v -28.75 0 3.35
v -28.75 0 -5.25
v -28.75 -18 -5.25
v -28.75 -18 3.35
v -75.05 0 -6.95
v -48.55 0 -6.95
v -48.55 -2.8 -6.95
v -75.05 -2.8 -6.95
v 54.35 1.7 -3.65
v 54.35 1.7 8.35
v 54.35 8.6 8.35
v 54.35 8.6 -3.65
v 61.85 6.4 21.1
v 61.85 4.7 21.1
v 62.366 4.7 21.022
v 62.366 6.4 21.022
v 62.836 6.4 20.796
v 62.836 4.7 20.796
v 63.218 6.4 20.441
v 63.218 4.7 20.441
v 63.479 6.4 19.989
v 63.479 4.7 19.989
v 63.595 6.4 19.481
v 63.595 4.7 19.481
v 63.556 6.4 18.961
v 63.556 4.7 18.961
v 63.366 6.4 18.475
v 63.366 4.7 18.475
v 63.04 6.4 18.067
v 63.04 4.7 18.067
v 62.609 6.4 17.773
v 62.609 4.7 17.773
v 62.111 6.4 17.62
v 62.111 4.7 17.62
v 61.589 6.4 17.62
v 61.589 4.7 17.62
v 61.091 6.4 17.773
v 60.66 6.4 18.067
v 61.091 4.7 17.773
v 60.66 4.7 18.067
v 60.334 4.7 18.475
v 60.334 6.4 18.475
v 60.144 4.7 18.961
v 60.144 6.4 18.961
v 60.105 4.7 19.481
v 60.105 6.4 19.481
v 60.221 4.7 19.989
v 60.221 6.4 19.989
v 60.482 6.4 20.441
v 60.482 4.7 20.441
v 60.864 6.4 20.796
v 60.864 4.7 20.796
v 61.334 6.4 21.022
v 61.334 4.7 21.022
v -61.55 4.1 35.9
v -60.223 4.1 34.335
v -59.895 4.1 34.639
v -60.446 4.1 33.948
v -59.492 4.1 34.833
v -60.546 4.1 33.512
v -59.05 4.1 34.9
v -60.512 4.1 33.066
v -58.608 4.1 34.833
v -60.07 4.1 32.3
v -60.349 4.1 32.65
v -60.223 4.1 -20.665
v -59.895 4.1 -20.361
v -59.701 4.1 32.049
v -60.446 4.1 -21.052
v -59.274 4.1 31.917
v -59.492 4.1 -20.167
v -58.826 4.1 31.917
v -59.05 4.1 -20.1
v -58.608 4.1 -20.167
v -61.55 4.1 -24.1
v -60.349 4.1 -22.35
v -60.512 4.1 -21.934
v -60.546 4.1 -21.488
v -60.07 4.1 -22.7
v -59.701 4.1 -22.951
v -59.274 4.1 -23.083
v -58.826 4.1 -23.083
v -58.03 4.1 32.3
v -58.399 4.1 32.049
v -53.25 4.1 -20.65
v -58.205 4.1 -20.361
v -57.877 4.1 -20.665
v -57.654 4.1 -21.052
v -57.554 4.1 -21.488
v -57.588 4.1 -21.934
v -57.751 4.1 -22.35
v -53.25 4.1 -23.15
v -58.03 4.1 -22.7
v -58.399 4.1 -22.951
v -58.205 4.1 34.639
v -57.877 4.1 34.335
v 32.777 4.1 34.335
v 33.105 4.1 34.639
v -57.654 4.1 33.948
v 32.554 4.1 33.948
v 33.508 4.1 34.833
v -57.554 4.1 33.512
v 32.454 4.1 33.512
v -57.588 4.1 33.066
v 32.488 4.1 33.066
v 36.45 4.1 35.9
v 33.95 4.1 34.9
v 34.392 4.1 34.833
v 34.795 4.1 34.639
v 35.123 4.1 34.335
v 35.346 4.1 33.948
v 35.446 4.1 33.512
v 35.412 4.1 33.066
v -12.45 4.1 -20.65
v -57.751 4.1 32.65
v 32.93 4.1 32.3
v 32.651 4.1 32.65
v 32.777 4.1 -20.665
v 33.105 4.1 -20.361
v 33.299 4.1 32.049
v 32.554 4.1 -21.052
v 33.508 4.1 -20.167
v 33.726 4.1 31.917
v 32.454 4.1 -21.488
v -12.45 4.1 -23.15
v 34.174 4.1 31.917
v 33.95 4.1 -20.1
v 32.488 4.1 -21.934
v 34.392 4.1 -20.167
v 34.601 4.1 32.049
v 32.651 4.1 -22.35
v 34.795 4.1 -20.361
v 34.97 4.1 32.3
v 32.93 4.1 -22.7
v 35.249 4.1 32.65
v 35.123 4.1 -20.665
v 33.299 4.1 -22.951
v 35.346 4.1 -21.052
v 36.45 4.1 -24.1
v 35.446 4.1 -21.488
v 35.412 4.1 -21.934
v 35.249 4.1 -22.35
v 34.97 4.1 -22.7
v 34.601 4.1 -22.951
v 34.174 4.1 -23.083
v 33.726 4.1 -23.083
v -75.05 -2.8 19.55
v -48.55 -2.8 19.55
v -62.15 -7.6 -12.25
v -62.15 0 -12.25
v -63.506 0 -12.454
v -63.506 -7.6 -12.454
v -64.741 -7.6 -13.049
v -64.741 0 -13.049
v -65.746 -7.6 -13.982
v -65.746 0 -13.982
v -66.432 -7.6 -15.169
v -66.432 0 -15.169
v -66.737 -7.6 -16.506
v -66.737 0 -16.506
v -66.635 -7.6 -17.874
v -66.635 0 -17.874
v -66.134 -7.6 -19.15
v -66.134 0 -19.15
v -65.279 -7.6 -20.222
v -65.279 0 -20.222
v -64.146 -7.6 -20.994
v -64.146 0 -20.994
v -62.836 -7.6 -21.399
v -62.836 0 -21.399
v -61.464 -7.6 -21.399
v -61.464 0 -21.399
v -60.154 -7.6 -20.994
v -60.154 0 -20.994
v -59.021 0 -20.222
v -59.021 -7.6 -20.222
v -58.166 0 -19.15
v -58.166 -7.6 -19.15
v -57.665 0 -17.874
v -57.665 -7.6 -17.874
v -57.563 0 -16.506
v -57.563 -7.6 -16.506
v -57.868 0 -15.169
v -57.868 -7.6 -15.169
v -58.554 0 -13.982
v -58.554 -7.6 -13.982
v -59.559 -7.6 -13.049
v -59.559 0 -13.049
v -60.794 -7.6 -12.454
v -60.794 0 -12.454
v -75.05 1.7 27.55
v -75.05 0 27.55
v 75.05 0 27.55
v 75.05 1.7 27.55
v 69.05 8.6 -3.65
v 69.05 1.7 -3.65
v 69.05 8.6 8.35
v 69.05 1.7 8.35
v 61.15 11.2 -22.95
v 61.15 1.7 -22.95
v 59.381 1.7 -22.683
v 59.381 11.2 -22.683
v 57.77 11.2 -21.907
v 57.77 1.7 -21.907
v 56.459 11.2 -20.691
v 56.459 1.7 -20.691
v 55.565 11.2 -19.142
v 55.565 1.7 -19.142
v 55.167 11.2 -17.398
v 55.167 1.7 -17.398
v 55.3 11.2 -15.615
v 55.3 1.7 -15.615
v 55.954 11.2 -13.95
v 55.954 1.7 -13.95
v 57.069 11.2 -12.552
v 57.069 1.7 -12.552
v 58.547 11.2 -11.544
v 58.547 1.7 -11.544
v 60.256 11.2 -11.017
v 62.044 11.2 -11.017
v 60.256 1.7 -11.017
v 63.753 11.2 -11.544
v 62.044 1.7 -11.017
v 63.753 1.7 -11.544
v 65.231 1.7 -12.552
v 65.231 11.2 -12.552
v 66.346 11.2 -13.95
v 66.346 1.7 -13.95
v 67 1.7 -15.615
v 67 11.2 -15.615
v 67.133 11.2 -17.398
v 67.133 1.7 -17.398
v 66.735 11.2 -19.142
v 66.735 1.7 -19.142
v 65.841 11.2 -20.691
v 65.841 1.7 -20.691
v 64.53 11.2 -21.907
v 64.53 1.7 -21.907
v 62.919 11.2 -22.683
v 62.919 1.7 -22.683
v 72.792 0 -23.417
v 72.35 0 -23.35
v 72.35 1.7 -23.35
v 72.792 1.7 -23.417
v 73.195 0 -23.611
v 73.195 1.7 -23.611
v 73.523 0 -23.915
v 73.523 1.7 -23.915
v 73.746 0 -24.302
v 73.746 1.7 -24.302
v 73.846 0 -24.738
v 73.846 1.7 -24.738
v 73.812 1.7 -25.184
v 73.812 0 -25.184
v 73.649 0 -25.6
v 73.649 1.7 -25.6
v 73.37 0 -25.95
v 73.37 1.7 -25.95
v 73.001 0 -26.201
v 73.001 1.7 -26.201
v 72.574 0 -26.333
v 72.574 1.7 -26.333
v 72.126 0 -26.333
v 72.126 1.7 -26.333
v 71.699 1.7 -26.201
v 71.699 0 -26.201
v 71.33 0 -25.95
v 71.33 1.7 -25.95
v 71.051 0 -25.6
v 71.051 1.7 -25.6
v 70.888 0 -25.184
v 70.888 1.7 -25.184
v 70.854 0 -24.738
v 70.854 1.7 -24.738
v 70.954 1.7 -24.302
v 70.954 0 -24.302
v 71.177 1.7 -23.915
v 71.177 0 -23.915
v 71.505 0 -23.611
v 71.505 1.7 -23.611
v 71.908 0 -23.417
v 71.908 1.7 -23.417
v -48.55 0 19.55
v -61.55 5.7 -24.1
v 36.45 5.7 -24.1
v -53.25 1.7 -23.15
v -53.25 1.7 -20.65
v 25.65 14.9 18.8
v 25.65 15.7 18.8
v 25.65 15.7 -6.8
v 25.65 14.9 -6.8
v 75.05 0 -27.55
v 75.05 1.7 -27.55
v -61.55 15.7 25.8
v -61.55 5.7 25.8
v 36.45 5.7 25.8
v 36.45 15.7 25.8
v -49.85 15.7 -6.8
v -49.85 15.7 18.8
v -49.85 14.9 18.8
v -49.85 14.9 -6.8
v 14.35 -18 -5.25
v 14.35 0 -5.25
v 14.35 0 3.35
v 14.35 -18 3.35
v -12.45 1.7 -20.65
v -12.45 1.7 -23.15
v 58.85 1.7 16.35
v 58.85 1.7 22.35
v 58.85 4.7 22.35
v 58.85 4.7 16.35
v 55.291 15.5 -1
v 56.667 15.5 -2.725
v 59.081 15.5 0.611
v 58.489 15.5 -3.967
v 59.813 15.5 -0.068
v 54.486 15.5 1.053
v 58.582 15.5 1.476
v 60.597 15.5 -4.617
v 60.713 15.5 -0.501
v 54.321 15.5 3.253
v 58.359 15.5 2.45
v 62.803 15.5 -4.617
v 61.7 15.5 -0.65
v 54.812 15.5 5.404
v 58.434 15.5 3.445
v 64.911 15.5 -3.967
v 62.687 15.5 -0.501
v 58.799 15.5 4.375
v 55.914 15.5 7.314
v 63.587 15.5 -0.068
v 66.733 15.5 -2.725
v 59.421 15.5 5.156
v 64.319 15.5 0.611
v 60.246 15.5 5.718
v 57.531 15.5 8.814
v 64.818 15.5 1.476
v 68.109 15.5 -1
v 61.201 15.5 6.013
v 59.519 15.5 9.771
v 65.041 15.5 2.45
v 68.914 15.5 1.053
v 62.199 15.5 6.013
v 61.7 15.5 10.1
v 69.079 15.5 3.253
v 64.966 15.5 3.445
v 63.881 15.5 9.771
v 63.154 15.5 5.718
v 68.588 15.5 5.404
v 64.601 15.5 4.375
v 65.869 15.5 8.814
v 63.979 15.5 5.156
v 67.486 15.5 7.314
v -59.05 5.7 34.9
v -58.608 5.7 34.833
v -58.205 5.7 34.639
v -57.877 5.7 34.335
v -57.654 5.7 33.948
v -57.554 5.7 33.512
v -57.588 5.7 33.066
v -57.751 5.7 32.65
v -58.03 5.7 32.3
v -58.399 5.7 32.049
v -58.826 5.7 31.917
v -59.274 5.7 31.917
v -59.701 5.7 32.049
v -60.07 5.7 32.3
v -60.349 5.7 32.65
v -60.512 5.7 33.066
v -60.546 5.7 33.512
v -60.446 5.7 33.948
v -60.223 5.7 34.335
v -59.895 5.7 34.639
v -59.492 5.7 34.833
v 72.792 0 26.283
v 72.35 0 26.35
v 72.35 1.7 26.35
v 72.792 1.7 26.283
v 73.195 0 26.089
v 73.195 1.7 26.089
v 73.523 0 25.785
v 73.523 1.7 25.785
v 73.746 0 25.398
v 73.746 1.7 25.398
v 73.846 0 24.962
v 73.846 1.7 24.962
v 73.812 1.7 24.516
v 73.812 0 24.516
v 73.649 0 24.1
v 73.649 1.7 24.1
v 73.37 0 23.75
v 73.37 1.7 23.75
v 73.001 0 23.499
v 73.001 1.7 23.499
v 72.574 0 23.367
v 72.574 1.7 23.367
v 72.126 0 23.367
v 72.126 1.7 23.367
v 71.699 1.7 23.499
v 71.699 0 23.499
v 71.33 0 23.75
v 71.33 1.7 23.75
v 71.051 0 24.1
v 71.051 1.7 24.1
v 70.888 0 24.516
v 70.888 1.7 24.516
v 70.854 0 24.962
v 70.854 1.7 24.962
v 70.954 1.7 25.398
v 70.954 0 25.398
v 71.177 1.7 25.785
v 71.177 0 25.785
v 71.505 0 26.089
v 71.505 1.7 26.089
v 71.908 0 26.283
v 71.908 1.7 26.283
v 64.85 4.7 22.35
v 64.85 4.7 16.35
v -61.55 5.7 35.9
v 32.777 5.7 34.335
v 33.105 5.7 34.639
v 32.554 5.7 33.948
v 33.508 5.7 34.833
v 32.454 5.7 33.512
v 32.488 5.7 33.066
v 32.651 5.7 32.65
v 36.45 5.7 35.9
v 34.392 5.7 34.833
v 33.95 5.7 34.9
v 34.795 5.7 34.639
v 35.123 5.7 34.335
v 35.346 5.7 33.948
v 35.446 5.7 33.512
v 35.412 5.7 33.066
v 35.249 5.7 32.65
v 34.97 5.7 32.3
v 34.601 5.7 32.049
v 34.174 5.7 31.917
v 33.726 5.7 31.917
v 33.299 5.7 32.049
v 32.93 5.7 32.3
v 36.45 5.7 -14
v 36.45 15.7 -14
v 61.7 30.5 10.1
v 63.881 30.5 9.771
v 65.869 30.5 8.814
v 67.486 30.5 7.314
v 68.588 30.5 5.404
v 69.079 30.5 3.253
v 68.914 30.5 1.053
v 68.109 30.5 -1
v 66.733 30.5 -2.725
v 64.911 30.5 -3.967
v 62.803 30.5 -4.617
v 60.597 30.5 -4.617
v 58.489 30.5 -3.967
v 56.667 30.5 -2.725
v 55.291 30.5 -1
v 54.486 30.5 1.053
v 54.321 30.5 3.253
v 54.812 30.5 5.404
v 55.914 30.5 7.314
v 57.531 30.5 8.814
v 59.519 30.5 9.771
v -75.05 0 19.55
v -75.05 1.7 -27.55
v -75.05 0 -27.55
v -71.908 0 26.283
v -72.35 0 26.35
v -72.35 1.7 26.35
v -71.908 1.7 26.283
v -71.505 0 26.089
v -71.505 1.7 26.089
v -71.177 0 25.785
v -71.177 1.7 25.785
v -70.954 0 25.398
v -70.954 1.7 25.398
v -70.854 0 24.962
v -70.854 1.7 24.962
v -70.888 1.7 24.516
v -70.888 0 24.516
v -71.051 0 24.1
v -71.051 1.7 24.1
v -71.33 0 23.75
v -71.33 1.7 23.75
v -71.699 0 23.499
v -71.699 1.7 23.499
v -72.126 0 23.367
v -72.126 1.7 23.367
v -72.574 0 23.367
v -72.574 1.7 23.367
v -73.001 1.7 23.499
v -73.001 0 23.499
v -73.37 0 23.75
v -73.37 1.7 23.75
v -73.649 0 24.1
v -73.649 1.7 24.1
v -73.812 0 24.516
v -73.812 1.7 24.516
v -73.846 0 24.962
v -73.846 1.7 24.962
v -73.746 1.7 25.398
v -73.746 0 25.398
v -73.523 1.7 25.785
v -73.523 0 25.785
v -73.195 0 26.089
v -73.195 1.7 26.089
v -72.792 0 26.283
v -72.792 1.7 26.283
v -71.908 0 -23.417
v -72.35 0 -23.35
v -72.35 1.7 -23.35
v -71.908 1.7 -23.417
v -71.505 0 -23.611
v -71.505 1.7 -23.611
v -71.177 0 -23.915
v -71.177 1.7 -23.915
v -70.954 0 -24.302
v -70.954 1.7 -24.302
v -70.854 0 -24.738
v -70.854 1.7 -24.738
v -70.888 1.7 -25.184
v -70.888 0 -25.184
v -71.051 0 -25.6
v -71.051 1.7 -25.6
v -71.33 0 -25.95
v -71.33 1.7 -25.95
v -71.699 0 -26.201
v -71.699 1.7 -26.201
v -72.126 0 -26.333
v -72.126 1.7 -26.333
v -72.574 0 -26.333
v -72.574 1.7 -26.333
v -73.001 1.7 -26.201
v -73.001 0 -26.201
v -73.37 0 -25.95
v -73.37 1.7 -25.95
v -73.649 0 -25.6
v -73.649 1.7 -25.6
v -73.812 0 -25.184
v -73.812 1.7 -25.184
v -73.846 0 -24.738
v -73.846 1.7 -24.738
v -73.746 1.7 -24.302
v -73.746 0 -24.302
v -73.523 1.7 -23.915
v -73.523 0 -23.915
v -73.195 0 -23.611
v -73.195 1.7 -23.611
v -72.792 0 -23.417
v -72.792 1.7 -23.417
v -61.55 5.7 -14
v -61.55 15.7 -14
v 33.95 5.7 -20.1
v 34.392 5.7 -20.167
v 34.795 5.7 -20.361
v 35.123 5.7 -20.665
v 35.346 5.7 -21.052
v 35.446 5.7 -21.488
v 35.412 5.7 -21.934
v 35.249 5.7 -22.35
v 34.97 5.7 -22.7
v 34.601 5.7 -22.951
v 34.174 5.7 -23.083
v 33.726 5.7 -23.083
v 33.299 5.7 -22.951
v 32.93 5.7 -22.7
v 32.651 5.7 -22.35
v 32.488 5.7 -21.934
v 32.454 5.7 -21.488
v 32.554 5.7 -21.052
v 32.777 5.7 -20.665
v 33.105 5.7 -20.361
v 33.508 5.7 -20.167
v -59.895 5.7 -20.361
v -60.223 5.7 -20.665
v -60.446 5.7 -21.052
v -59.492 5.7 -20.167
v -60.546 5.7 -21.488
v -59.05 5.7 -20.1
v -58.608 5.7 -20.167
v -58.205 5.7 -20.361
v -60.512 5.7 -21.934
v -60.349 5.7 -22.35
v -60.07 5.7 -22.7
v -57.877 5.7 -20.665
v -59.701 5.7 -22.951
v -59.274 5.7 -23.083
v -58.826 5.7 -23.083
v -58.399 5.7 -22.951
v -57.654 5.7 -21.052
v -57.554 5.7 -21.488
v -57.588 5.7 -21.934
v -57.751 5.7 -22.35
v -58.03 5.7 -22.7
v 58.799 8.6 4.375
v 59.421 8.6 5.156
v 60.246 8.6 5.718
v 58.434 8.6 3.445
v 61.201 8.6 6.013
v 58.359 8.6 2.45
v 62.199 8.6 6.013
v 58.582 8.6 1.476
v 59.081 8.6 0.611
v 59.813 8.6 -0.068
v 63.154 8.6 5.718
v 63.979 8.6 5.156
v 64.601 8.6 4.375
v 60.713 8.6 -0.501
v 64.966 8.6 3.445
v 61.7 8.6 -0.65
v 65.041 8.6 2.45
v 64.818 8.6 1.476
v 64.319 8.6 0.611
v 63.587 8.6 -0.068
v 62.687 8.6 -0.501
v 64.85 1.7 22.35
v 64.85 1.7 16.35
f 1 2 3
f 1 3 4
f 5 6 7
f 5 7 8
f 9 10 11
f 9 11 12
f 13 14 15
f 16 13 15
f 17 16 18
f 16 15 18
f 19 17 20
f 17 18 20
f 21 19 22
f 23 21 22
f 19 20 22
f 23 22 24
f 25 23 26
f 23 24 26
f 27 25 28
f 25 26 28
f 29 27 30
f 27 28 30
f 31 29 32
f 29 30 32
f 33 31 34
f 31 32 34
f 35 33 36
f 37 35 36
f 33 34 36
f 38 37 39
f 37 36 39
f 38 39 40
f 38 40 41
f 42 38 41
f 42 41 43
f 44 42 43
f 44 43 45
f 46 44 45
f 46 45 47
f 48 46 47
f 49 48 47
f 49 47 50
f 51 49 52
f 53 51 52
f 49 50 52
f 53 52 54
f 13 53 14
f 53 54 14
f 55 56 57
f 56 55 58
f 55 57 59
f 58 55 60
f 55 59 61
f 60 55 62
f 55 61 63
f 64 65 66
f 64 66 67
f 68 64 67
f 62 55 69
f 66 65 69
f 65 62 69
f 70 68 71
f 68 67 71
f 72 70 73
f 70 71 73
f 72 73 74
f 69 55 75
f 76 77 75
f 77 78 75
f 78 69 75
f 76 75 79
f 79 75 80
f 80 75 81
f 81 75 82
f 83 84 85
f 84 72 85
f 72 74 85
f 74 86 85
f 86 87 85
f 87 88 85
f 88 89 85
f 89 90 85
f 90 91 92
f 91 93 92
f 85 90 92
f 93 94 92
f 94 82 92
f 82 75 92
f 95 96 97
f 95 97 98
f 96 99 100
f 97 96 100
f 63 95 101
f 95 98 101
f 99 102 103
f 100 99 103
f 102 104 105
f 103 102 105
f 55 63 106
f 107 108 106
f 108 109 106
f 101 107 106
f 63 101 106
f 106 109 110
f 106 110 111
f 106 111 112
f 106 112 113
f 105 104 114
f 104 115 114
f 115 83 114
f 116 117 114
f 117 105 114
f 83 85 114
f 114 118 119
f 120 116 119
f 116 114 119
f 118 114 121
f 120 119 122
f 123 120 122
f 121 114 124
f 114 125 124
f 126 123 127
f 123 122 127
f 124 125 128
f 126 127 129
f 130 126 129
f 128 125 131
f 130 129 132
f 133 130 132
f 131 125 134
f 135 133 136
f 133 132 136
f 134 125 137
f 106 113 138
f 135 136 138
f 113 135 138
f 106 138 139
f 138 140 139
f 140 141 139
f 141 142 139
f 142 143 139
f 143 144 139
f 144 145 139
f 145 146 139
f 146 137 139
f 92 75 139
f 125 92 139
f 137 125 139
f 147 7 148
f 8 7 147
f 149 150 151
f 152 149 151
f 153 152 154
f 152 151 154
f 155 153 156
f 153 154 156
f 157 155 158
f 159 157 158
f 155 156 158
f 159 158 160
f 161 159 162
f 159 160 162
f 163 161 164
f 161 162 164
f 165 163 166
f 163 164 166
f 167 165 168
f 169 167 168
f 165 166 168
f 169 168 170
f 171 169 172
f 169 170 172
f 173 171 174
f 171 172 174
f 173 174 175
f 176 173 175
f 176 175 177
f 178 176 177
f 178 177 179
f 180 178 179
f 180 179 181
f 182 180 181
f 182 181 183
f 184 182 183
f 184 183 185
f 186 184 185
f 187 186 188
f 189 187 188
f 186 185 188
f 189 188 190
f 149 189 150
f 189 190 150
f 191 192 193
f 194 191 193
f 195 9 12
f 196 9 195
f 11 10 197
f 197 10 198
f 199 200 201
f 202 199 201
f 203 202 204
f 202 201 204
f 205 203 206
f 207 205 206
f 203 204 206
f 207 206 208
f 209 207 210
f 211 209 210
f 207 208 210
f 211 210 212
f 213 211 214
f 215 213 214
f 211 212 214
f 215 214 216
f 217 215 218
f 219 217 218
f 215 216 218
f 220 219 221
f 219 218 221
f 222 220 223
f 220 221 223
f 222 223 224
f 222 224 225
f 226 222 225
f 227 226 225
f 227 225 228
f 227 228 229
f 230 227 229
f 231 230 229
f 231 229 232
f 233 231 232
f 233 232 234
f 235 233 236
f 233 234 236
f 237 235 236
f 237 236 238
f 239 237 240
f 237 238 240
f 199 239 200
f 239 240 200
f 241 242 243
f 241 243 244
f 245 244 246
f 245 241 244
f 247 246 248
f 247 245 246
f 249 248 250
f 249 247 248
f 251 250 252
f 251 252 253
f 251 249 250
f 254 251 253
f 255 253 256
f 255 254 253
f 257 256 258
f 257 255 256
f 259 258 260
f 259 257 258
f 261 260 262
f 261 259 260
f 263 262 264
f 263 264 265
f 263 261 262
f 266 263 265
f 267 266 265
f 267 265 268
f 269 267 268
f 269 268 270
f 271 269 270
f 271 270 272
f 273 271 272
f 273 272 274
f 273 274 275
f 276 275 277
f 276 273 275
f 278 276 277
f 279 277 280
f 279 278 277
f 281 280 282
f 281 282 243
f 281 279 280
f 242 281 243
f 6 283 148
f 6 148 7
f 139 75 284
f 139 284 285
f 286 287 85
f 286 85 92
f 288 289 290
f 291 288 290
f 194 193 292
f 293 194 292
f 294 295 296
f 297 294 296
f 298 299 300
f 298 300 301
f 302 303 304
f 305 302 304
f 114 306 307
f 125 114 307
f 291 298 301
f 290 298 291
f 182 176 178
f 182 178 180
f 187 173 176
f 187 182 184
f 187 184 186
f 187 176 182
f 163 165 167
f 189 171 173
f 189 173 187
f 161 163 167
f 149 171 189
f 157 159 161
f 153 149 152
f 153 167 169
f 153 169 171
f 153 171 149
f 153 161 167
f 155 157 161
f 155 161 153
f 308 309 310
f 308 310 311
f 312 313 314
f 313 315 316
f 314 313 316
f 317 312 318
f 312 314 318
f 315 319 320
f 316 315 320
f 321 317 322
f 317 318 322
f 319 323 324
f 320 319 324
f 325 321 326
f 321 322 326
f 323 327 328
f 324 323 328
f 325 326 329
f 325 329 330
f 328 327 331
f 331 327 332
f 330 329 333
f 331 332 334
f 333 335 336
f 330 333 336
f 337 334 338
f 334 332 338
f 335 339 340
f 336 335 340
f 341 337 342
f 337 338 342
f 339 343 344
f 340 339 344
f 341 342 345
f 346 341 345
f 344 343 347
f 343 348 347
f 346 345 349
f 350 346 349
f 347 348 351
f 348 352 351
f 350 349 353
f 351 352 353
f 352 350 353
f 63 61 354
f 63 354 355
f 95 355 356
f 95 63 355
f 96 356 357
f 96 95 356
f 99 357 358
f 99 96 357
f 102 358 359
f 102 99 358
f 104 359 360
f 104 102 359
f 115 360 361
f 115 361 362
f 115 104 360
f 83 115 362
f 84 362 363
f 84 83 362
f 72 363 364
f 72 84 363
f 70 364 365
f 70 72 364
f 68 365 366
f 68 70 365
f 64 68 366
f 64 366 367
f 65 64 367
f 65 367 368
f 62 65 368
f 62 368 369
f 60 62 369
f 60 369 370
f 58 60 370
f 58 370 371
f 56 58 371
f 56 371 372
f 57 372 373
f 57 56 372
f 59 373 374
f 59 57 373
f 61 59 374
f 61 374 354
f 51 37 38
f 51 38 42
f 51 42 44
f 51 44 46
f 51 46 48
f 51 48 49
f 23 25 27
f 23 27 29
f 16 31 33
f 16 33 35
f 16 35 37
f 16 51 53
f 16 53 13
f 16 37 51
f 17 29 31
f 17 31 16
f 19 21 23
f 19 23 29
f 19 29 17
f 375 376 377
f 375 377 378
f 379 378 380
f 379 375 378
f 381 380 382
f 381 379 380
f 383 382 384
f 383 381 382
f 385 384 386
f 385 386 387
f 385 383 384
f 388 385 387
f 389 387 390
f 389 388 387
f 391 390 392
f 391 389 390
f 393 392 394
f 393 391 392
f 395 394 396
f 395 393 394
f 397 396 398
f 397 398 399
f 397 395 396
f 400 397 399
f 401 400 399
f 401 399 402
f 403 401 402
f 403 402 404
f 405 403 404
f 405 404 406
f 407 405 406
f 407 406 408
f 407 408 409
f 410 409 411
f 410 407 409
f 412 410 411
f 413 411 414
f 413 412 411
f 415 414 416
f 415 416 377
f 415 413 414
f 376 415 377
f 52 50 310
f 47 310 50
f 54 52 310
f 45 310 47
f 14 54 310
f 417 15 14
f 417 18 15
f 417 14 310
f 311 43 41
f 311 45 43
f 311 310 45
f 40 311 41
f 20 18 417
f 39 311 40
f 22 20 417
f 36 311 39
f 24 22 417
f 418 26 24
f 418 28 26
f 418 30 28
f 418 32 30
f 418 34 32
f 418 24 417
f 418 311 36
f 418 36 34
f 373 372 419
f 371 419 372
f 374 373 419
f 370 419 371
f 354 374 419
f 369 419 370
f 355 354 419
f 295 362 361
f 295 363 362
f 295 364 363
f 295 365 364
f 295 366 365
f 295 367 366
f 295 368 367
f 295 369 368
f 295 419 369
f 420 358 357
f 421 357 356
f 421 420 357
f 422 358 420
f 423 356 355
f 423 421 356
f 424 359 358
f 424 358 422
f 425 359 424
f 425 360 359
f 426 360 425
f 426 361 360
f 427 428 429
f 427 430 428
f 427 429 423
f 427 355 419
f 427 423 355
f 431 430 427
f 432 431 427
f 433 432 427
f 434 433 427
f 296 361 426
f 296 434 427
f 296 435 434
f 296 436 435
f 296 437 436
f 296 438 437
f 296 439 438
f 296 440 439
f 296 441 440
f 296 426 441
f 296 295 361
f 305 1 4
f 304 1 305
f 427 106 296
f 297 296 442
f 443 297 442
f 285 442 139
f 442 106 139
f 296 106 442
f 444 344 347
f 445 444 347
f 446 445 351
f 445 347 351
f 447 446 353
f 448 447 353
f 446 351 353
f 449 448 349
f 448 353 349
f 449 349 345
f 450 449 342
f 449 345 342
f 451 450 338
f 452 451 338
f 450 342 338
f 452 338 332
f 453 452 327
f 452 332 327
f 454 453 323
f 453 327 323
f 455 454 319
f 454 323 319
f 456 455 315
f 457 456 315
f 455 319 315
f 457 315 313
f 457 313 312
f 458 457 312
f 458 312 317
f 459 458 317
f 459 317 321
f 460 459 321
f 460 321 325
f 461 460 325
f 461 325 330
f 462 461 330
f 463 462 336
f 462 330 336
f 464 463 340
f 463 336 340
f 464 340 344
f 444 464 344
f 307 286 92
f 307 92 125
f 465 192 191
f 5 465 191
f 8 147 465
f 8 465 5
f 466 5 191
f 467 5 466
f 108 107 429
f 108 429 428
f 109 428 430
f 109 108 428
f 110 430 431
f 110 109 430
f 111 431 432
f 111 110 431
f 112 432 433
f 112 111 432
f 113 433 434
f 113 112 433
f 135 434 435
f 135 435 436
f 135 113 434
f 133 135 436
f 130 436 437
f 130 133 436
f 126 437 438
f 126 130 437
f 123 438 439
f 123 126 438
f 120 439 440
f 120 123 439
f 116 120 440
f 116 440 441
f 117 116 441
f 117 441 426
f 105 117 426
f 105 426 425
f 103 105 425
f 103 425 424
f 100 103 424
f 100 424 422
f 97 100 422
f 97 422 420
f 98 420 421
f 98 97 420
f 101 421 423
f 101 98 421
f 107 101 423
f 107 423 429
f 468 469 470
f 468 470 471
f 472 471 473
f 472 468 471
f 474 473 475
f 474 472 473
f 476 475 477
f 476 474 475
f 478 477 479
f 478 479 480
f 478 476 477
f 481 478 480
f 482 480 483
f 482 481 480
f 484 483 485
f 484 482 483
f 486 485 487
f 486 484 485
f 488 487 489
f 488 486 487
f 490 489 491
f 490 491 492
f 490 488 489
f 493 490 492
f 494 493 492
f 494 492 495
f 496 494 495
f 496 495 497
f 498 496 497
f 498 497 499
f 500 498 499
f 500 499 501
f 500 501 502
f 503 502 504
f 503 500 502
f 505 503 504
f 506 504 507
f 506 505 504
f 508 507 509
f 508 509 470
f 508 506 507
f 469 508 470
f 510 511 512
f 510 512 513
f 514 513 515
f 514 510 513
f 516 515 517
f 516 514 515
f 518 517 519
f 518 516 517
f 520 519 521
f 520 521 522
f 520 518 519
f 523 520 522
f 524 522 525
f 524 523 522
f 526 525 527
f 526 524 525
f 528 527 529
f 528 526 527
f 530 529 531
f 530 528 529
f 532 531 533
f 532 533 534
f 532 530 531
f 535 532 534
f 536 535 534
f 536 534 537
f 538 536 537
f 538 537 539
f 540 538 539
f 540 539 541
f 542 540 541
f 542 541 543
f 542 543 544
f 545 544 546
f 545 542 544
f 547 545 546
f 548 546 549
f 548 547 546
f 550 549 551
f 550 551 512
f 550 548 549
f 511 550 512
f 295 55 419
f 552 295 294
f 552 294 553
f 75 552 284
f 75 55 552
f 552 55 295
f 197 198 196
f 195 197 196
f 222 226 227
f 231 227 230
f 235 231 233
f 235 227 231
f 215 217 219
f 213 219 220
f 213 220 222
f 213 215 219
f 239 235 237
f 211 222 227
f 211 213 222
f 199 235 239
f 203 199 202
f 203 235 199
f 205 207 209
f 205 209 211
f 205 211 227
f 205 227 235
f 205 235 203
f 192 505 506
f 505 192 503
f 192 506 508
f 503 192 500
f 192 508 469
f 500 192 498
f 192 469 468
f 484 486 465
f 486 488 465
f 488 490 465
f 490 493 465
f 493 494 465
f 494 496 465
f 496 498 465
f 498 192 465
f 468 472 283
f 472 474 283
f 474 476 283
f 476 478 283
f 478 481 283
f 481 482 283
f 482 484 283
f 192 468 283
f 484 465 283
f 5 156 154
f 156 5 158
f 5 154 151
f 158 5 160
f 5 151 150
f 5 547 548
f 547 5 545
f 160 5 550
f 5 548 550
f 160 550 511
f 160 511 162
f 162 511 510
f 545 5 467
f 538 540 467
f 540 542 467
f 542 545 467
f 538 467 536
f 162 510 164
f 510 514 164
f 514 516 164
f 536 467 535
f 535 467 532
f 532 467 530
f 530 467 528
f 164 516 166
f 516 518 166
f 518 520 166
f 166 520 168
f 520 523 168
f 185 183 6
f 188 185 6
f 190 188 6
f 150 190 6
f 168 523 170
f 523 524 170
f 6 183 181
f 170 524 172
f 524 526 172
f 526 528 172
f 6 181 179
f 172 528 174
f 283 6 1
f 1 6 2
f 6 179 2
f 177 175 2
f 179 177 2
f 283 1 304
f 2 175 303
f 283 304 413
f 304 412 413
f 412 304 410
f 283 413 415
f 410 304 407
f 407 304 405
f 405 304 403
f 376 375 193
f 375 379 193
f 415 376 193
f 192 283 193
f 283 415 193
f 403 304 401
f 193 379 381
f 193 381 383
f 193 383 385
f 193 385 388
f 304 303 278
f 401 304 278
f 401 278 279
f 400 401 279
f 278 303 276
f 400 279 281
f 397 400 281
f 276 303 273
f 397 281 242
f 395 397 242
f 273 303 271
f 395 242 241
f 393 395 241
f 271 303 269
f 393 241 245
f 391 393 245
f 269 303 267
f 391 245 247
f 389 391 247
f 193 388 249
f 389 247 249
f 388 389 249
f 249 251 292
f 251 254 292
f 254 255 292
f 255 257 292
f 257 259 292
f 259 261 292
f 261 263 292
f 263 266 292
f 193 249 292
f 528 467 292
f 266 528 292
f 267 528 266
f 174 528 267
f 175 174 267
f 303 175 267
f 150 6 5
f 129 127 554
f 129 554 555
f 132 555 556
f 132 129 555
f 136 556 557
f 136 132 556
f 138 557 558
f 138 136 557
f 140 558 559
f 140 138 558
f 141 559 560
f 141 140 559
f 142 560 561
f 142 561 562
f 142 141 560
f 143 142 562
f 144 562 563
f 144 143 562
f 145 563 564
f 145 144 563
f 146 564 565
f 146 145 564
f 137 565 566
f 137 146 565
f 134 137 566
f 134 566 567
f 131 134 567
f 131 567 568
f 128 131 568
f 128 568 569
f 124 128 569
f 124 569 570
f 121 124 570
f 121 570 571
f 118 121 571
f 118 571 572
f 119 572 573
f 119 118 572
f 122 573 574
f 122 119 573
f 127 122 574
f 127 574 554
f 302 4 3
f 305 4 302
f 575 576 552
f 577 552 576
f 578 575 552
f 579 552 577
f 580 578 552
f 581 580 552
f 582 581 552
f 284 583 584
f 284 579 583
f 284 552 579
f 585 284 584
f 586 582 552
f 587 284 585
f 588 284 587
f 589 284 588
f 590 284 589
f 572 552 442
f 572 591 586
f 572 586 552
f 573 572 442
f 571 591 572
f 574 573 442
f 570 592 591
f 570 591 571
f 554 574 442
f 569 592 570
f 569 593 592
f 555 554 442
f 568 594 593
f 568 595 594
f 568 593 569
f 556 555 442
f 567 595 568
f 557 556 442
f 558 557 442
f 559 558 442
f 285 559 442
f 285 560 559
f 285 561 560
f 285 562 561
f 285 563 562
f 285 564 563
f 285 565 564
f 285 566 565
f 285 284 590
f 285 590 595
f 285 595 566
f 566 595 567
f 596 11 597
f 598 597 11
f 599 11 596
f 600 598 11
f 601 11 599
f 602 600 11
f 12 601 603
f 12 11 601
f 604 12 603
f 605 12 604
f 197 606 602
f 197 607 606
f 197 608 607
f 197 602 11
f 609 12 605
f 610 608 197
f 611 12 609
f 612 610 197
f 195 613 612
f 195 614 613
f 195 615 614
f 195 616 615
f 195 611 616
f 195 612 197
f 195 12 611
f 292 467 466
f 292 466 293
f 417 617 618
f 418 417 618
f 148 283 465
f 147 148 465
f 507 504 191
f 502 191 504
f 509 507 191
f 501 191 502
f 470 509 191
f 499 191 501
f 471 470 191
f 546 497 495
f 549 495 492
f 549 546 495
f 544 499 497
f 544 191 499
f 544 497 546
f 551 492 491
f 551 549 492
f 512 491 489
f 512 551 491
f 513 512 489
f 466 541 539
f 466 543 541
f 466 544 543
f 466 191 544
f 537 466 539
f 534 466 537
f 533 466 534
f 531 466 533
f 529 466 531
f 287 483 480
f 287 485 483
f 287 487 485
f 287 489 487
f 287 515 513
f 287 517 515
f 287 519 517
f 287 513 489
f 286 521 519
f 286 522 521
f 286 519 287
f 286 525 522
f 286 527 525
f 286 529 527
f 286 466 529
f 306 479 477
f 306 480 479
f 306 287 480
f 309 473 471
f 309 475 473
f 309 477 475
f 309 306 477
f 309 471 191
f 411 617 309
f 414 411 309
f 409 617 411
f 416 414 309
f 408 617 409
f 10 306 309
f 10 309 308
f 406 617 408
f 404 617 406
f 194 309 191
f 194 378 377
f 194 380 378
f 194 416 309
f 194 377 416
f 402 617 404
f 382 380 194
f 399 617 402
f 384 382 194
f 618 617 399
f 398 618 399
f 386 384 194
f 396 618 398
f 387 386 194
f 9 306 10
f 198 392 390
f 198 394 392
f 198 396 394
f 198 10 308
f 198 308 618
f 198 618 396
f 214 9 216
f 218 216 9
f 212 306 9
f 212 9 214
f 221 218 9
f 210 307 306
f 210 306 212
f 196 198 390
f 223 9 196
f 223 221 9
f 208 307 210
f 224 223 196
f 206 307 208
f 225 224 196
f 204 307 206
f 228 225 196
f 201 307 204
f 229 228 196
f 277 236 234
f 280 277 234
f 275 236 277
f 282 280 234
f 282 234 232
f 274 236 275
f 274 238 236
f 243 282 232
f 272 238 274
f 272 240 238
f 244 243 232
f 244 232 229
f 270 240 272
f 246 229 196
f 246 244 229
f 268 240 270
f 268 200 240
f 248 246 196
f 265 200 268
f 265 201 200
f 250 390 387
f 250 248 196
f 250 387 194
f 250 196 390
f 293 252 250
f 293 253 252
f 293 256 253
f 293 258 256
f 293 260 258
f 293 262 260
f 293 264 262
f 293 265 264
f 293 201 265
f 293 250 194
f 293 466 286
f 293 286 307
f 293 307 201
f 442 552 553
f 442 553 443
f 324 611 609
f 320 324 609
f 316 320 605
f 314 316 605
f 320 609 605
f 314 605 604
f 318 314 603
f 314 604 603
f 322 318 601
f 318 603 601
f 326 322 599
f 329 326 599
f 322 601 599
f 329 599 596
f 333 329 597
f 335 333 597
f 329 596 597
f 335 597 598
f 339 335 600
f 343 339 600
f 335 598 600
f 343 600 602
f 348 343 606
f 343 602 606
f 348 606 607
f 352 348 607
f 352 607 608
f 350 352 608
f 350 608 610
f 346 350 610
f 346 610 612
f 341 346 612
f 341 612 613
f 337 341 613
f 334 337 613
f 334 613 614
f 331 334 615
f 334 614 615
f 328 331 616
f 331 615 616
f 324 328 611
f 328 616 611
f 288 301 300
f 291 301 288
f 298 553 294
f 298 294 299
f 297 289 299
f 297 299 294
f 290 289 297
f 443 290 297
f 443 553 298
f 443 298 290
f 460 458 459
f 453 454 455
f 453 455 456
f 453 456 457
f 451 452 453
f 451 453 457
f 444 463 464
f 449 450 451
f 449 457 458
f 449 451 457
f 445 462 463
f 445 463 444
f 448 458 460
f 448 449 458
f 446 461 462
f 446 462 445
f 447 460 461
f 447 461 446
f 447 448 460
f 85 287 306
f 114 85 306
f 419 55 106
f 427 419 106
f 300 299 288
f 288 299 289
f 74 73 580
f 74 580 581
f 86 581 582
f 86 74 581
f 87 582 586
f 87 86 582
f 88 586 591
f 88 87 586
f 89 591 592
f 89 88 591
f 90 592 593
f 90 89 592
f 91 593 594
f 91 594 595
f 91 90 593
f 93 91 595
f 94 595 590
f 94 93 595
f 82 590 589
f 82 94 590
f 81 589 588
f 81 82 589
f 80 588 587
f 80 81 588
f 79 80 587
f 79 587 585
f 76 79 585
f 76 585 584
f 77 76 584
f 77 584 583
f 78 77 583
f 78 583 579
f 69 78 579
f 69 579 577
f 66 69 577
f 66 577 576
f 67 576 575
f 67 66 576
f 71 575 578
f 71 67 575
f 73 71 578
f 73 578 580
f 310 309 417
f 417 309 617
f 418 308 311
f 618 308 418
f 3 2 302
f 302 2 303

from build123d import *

# Parameters (mm, degrees)
SKETCH1_W            = 150.1
SKETCH1_H            = 55.1
SKETCH1_R            = 1.5
BOSS_EXTRUDE1_DEPTH  = 1.7
SKETCH2_W            = 40.8
SKETCH2_H            = 2.5
BOSS_EXTRUDE2_DEPTH  = 2.4
SKETCH3_W            = 98
SKETCH3_H            = 60
SKETCH3_R            = 1.5
BOSS_EXTRUDE3_DEPTH  = 1.6
SKETCH4_W            = 98
SKETCH4_H            = 39.8
BOSS_EXTRUDE4_DEPTH  = 10
SKETCH5_W            = 75.5
SKETCH5_H            = 25.6
CUT_EXTRUDE1_DEPTH   = 0.8
SKETCH6_R            = 6
BOSS_EXTRUDE5_DEPTH  = 9.5
SKETCH7_W            = 6
SKETCH7_H            = 6
BOSS_EXTRUDE6_DEPTH  = 3
SKETCH8_R            = 1.75
BOSS_EXTRUDE7_DEPTH  = 1.7
SKETCH9_W            = 14.7
SKETCH9_H            = 12
BOSS_EXTRUDE8_DEPTH  = 6.9
SKETCH10_R           = 3.35
BOSS_EXTRUDE9_DEPTH  = 6.9
SKETCH11_R           = 7.4
BOSS_EXTRUDE10_DEPTH = 15
SKETCH12_W           = 26.5
SKETCH12_H           = 26.5
BOSS_EXTRUDE11_DEPTH = 2.8
SKETCH13_R           = 4.6
BOSS_EXTRUDE12_DEPTH = 7.6
SKETCH14_W           = 43.1
SKETCH14_H           = 8.6
BOSS_EXTRUDE13_DEPTH = 18


with BuildPart() as part:
    # Sketch1 → Boss-Extrude1 (new body)
    with BuildSketch(Plane(origin=(0, 0, 0), x_dir=(1, 0, 0), z_dir=(0, 1, 0))):
        Rectangle(SKETCH1_W, SKETCH1_H)
        with Locations((-72.35, 24.85)):
            Circle(SKETCH1_R, mode=Mode.SUBTRACT)
        with Locations((-72.35, -24.85)):
            Circle(SKETCH1_R, mode=Mode.SUBTRACT)
        with Locations((72.35, 24.85)):
            Circle(SKETCH1_R, mode=Mode.SUBTRACT)
        with Locations((72.35, -24.85)):
            Circle(SKETCH1_R, mode=Mode.SUBTRACT)
    extrude(amount=BOSS_EXTRUDE1_DEPTH)

    # Sketch2 → Boss-Extrude2 (add)
    with BuildSketch(Plane(origin=(0, 1.7, 0), x_dir=(1, 0, 0), z_dir=(0, 1, 0))):
        with Locations((-32.85, 21.9)):
            Rectangle(SKETCH2_W, SKETCH2_H)
    extrude(amount=BOSS_EXTRUDE2_DEPTH)

    # Sketch3 → Boss-Extrude3 (add)
    with BuildSketch(Plane(origin=(0, 4.1, 0), x_dir=(1, 0, 0), z_dir=(0, 1, 0))):
        with Locations((-12.55, -5.9)):
            Rectangle(SKETCH3_W, SKETCH3_H)
        with Locations((-59.05, 21.6)):
            Circle(SKETCH3_R, mode=Mode.SUBTRACT)
        with Locations((33.95, 21.6)):
            Circle(SKETCH3_R, mode=Mode.SUBTRACT)
        with Locations((33.95, -33.4)):
            Circle(SKETCH3_R, mode=Mode.SUBTRACT)
        with Locations((-59.05, -33.4)):
            Circle(SKETCH3_R, mode=Mode.SUBTRACT)
    extrude(amount=BOSS_EXTRUDE3_DEPTH)

    # Sketch4 → Boss-Extrude4 (add)
    with BuildSketch(Plane(origin=(0, 5.7, 0), x_dir=(1, 0, 0), z_dir=(0, 1, 0))):
        with Locations((-12.55, -5.9)):
            Rectangle(SKETCH4_W, SKETCH4_H)
    extrude(amount=BOSS_EXTRUDE4_DEPTH)

    # Sketch5 → Cut-Extrude1 (cut)
    with BuildSketch(Plane(origin=(0, 15.7, 0), x_dir=(1, 0, 0), z_dir=(0, 1, 0))):
        with Locations((-12.1, -6)):
            Rectangle(SKETCH5_W, SKETCH5_H)
    extrude(amount=-CUT_EXTRUDE1_DEPTH, mode=Mode.SUBTRACT)

    # Sketch6 → Boss-Extrude5 (add)
    with BuildSketch(Plane(origin=(0, 1.7, 0), x_dir=(1, 0, 0), z_dir=(0, 1, 0))):
        with Locations((61.15, 16.95)):
            Circle(SKETCH6_R)
    extrude(amount=BOSS_EXTRUDE5_DEPTH)

    # Sketch7 → Boss-Extrude6 (add)
    with BuildSketch(Plane(origin=(0, 1.7, 0), x_dir=(1, 0, 0), z_dir=(0, 1, 0))):
        with Locations((61.85, -19.35)):
            Rectangle(SKETCH7_W, SKETCH7_H)
    extrude(amount=BOSS_EXTRUDE6_DEPTH)

    # Sketch8 → Boss-Extrude7 (add)
    with BuildSketch(Plane(origin=(0, 4.7, 0), x_dir=(1, 0, 0), z_dir=(0, 1, 0))):
        with Locations((61.85, -19.35)):
            Circle(SKETCH8_R)
    extrude(amount=BOSS_EXTRUDE7_DEPTH)

    # Sketch9 → Boss-Extrude8 (add)
    with BuildSketch(Plane(origin=(0, 1.7, 0), x_dir=(1, 0, 0), z_dir=(0, 1, 0))):
        with Locations((61.7, -2.35)):
            Rectangle(SKETCH9_W, SKETCH9_H)
    extrude(amount=BOSS_EXTRUDE8_DEPTH)

    # Sketch10 → Boss-Extrude9 (add)
    with BuildSketch(Plane(origin=(0, 8.6, 0), x_dir=(1, 0, 0), z_dir=(0, 1, 0))):
        with Locations((61.7, -2.7)):
            Circle(SKETCH10_R)
    extrude(amount=BOSS_EXTRUDE9_DEPTH)

    # Sketch11 → Boss-Extrude10 (add)
    with BuildSketch(Plane(origin=(0, 15.5, 0), x_dir=(1, 0, 0), z_dir=(0, 1, 0))):
        with Locations((61.7, -2.7)):
            Circle(SKETCH11_R)
    extrude(amount=BOSS_EXTRUDE10_DEPTH)

    # Sketch12 → Boss-Extrude11 (add)
    with BuildSketch(Plane(origin=(0, 0, 0), x_dir=(-1, 0, 0), z_dir=(0, -1, 0))):
        with Locations((61.8, -6.3)):
            Rectangle(SKETCH12_W, SKETCH12_H)
    extrude(amount=BOSS_EXTRUDE11_DEPTH)

    # Sketch13 → Boss-Extrude12 (add)
    with BuildSketch(Plane.XZ):
        with Locations((-62.15, -16.85)):
            Circle(SKETCH13_R)
    extrude(amount=BOSS_EXTRUDE12_DEPTH)

    # Sketch14 → Boss-Extrude13 (add)
    with BuildSketch(Plane.XZ):
        with Locations((-7.2, -0.95)):
            Rectangle(SKETCH14_W, SKETCH14_H)
    extrude(amount=BOSS_EXTRUDE13_DEPTH)


solid = part.part
